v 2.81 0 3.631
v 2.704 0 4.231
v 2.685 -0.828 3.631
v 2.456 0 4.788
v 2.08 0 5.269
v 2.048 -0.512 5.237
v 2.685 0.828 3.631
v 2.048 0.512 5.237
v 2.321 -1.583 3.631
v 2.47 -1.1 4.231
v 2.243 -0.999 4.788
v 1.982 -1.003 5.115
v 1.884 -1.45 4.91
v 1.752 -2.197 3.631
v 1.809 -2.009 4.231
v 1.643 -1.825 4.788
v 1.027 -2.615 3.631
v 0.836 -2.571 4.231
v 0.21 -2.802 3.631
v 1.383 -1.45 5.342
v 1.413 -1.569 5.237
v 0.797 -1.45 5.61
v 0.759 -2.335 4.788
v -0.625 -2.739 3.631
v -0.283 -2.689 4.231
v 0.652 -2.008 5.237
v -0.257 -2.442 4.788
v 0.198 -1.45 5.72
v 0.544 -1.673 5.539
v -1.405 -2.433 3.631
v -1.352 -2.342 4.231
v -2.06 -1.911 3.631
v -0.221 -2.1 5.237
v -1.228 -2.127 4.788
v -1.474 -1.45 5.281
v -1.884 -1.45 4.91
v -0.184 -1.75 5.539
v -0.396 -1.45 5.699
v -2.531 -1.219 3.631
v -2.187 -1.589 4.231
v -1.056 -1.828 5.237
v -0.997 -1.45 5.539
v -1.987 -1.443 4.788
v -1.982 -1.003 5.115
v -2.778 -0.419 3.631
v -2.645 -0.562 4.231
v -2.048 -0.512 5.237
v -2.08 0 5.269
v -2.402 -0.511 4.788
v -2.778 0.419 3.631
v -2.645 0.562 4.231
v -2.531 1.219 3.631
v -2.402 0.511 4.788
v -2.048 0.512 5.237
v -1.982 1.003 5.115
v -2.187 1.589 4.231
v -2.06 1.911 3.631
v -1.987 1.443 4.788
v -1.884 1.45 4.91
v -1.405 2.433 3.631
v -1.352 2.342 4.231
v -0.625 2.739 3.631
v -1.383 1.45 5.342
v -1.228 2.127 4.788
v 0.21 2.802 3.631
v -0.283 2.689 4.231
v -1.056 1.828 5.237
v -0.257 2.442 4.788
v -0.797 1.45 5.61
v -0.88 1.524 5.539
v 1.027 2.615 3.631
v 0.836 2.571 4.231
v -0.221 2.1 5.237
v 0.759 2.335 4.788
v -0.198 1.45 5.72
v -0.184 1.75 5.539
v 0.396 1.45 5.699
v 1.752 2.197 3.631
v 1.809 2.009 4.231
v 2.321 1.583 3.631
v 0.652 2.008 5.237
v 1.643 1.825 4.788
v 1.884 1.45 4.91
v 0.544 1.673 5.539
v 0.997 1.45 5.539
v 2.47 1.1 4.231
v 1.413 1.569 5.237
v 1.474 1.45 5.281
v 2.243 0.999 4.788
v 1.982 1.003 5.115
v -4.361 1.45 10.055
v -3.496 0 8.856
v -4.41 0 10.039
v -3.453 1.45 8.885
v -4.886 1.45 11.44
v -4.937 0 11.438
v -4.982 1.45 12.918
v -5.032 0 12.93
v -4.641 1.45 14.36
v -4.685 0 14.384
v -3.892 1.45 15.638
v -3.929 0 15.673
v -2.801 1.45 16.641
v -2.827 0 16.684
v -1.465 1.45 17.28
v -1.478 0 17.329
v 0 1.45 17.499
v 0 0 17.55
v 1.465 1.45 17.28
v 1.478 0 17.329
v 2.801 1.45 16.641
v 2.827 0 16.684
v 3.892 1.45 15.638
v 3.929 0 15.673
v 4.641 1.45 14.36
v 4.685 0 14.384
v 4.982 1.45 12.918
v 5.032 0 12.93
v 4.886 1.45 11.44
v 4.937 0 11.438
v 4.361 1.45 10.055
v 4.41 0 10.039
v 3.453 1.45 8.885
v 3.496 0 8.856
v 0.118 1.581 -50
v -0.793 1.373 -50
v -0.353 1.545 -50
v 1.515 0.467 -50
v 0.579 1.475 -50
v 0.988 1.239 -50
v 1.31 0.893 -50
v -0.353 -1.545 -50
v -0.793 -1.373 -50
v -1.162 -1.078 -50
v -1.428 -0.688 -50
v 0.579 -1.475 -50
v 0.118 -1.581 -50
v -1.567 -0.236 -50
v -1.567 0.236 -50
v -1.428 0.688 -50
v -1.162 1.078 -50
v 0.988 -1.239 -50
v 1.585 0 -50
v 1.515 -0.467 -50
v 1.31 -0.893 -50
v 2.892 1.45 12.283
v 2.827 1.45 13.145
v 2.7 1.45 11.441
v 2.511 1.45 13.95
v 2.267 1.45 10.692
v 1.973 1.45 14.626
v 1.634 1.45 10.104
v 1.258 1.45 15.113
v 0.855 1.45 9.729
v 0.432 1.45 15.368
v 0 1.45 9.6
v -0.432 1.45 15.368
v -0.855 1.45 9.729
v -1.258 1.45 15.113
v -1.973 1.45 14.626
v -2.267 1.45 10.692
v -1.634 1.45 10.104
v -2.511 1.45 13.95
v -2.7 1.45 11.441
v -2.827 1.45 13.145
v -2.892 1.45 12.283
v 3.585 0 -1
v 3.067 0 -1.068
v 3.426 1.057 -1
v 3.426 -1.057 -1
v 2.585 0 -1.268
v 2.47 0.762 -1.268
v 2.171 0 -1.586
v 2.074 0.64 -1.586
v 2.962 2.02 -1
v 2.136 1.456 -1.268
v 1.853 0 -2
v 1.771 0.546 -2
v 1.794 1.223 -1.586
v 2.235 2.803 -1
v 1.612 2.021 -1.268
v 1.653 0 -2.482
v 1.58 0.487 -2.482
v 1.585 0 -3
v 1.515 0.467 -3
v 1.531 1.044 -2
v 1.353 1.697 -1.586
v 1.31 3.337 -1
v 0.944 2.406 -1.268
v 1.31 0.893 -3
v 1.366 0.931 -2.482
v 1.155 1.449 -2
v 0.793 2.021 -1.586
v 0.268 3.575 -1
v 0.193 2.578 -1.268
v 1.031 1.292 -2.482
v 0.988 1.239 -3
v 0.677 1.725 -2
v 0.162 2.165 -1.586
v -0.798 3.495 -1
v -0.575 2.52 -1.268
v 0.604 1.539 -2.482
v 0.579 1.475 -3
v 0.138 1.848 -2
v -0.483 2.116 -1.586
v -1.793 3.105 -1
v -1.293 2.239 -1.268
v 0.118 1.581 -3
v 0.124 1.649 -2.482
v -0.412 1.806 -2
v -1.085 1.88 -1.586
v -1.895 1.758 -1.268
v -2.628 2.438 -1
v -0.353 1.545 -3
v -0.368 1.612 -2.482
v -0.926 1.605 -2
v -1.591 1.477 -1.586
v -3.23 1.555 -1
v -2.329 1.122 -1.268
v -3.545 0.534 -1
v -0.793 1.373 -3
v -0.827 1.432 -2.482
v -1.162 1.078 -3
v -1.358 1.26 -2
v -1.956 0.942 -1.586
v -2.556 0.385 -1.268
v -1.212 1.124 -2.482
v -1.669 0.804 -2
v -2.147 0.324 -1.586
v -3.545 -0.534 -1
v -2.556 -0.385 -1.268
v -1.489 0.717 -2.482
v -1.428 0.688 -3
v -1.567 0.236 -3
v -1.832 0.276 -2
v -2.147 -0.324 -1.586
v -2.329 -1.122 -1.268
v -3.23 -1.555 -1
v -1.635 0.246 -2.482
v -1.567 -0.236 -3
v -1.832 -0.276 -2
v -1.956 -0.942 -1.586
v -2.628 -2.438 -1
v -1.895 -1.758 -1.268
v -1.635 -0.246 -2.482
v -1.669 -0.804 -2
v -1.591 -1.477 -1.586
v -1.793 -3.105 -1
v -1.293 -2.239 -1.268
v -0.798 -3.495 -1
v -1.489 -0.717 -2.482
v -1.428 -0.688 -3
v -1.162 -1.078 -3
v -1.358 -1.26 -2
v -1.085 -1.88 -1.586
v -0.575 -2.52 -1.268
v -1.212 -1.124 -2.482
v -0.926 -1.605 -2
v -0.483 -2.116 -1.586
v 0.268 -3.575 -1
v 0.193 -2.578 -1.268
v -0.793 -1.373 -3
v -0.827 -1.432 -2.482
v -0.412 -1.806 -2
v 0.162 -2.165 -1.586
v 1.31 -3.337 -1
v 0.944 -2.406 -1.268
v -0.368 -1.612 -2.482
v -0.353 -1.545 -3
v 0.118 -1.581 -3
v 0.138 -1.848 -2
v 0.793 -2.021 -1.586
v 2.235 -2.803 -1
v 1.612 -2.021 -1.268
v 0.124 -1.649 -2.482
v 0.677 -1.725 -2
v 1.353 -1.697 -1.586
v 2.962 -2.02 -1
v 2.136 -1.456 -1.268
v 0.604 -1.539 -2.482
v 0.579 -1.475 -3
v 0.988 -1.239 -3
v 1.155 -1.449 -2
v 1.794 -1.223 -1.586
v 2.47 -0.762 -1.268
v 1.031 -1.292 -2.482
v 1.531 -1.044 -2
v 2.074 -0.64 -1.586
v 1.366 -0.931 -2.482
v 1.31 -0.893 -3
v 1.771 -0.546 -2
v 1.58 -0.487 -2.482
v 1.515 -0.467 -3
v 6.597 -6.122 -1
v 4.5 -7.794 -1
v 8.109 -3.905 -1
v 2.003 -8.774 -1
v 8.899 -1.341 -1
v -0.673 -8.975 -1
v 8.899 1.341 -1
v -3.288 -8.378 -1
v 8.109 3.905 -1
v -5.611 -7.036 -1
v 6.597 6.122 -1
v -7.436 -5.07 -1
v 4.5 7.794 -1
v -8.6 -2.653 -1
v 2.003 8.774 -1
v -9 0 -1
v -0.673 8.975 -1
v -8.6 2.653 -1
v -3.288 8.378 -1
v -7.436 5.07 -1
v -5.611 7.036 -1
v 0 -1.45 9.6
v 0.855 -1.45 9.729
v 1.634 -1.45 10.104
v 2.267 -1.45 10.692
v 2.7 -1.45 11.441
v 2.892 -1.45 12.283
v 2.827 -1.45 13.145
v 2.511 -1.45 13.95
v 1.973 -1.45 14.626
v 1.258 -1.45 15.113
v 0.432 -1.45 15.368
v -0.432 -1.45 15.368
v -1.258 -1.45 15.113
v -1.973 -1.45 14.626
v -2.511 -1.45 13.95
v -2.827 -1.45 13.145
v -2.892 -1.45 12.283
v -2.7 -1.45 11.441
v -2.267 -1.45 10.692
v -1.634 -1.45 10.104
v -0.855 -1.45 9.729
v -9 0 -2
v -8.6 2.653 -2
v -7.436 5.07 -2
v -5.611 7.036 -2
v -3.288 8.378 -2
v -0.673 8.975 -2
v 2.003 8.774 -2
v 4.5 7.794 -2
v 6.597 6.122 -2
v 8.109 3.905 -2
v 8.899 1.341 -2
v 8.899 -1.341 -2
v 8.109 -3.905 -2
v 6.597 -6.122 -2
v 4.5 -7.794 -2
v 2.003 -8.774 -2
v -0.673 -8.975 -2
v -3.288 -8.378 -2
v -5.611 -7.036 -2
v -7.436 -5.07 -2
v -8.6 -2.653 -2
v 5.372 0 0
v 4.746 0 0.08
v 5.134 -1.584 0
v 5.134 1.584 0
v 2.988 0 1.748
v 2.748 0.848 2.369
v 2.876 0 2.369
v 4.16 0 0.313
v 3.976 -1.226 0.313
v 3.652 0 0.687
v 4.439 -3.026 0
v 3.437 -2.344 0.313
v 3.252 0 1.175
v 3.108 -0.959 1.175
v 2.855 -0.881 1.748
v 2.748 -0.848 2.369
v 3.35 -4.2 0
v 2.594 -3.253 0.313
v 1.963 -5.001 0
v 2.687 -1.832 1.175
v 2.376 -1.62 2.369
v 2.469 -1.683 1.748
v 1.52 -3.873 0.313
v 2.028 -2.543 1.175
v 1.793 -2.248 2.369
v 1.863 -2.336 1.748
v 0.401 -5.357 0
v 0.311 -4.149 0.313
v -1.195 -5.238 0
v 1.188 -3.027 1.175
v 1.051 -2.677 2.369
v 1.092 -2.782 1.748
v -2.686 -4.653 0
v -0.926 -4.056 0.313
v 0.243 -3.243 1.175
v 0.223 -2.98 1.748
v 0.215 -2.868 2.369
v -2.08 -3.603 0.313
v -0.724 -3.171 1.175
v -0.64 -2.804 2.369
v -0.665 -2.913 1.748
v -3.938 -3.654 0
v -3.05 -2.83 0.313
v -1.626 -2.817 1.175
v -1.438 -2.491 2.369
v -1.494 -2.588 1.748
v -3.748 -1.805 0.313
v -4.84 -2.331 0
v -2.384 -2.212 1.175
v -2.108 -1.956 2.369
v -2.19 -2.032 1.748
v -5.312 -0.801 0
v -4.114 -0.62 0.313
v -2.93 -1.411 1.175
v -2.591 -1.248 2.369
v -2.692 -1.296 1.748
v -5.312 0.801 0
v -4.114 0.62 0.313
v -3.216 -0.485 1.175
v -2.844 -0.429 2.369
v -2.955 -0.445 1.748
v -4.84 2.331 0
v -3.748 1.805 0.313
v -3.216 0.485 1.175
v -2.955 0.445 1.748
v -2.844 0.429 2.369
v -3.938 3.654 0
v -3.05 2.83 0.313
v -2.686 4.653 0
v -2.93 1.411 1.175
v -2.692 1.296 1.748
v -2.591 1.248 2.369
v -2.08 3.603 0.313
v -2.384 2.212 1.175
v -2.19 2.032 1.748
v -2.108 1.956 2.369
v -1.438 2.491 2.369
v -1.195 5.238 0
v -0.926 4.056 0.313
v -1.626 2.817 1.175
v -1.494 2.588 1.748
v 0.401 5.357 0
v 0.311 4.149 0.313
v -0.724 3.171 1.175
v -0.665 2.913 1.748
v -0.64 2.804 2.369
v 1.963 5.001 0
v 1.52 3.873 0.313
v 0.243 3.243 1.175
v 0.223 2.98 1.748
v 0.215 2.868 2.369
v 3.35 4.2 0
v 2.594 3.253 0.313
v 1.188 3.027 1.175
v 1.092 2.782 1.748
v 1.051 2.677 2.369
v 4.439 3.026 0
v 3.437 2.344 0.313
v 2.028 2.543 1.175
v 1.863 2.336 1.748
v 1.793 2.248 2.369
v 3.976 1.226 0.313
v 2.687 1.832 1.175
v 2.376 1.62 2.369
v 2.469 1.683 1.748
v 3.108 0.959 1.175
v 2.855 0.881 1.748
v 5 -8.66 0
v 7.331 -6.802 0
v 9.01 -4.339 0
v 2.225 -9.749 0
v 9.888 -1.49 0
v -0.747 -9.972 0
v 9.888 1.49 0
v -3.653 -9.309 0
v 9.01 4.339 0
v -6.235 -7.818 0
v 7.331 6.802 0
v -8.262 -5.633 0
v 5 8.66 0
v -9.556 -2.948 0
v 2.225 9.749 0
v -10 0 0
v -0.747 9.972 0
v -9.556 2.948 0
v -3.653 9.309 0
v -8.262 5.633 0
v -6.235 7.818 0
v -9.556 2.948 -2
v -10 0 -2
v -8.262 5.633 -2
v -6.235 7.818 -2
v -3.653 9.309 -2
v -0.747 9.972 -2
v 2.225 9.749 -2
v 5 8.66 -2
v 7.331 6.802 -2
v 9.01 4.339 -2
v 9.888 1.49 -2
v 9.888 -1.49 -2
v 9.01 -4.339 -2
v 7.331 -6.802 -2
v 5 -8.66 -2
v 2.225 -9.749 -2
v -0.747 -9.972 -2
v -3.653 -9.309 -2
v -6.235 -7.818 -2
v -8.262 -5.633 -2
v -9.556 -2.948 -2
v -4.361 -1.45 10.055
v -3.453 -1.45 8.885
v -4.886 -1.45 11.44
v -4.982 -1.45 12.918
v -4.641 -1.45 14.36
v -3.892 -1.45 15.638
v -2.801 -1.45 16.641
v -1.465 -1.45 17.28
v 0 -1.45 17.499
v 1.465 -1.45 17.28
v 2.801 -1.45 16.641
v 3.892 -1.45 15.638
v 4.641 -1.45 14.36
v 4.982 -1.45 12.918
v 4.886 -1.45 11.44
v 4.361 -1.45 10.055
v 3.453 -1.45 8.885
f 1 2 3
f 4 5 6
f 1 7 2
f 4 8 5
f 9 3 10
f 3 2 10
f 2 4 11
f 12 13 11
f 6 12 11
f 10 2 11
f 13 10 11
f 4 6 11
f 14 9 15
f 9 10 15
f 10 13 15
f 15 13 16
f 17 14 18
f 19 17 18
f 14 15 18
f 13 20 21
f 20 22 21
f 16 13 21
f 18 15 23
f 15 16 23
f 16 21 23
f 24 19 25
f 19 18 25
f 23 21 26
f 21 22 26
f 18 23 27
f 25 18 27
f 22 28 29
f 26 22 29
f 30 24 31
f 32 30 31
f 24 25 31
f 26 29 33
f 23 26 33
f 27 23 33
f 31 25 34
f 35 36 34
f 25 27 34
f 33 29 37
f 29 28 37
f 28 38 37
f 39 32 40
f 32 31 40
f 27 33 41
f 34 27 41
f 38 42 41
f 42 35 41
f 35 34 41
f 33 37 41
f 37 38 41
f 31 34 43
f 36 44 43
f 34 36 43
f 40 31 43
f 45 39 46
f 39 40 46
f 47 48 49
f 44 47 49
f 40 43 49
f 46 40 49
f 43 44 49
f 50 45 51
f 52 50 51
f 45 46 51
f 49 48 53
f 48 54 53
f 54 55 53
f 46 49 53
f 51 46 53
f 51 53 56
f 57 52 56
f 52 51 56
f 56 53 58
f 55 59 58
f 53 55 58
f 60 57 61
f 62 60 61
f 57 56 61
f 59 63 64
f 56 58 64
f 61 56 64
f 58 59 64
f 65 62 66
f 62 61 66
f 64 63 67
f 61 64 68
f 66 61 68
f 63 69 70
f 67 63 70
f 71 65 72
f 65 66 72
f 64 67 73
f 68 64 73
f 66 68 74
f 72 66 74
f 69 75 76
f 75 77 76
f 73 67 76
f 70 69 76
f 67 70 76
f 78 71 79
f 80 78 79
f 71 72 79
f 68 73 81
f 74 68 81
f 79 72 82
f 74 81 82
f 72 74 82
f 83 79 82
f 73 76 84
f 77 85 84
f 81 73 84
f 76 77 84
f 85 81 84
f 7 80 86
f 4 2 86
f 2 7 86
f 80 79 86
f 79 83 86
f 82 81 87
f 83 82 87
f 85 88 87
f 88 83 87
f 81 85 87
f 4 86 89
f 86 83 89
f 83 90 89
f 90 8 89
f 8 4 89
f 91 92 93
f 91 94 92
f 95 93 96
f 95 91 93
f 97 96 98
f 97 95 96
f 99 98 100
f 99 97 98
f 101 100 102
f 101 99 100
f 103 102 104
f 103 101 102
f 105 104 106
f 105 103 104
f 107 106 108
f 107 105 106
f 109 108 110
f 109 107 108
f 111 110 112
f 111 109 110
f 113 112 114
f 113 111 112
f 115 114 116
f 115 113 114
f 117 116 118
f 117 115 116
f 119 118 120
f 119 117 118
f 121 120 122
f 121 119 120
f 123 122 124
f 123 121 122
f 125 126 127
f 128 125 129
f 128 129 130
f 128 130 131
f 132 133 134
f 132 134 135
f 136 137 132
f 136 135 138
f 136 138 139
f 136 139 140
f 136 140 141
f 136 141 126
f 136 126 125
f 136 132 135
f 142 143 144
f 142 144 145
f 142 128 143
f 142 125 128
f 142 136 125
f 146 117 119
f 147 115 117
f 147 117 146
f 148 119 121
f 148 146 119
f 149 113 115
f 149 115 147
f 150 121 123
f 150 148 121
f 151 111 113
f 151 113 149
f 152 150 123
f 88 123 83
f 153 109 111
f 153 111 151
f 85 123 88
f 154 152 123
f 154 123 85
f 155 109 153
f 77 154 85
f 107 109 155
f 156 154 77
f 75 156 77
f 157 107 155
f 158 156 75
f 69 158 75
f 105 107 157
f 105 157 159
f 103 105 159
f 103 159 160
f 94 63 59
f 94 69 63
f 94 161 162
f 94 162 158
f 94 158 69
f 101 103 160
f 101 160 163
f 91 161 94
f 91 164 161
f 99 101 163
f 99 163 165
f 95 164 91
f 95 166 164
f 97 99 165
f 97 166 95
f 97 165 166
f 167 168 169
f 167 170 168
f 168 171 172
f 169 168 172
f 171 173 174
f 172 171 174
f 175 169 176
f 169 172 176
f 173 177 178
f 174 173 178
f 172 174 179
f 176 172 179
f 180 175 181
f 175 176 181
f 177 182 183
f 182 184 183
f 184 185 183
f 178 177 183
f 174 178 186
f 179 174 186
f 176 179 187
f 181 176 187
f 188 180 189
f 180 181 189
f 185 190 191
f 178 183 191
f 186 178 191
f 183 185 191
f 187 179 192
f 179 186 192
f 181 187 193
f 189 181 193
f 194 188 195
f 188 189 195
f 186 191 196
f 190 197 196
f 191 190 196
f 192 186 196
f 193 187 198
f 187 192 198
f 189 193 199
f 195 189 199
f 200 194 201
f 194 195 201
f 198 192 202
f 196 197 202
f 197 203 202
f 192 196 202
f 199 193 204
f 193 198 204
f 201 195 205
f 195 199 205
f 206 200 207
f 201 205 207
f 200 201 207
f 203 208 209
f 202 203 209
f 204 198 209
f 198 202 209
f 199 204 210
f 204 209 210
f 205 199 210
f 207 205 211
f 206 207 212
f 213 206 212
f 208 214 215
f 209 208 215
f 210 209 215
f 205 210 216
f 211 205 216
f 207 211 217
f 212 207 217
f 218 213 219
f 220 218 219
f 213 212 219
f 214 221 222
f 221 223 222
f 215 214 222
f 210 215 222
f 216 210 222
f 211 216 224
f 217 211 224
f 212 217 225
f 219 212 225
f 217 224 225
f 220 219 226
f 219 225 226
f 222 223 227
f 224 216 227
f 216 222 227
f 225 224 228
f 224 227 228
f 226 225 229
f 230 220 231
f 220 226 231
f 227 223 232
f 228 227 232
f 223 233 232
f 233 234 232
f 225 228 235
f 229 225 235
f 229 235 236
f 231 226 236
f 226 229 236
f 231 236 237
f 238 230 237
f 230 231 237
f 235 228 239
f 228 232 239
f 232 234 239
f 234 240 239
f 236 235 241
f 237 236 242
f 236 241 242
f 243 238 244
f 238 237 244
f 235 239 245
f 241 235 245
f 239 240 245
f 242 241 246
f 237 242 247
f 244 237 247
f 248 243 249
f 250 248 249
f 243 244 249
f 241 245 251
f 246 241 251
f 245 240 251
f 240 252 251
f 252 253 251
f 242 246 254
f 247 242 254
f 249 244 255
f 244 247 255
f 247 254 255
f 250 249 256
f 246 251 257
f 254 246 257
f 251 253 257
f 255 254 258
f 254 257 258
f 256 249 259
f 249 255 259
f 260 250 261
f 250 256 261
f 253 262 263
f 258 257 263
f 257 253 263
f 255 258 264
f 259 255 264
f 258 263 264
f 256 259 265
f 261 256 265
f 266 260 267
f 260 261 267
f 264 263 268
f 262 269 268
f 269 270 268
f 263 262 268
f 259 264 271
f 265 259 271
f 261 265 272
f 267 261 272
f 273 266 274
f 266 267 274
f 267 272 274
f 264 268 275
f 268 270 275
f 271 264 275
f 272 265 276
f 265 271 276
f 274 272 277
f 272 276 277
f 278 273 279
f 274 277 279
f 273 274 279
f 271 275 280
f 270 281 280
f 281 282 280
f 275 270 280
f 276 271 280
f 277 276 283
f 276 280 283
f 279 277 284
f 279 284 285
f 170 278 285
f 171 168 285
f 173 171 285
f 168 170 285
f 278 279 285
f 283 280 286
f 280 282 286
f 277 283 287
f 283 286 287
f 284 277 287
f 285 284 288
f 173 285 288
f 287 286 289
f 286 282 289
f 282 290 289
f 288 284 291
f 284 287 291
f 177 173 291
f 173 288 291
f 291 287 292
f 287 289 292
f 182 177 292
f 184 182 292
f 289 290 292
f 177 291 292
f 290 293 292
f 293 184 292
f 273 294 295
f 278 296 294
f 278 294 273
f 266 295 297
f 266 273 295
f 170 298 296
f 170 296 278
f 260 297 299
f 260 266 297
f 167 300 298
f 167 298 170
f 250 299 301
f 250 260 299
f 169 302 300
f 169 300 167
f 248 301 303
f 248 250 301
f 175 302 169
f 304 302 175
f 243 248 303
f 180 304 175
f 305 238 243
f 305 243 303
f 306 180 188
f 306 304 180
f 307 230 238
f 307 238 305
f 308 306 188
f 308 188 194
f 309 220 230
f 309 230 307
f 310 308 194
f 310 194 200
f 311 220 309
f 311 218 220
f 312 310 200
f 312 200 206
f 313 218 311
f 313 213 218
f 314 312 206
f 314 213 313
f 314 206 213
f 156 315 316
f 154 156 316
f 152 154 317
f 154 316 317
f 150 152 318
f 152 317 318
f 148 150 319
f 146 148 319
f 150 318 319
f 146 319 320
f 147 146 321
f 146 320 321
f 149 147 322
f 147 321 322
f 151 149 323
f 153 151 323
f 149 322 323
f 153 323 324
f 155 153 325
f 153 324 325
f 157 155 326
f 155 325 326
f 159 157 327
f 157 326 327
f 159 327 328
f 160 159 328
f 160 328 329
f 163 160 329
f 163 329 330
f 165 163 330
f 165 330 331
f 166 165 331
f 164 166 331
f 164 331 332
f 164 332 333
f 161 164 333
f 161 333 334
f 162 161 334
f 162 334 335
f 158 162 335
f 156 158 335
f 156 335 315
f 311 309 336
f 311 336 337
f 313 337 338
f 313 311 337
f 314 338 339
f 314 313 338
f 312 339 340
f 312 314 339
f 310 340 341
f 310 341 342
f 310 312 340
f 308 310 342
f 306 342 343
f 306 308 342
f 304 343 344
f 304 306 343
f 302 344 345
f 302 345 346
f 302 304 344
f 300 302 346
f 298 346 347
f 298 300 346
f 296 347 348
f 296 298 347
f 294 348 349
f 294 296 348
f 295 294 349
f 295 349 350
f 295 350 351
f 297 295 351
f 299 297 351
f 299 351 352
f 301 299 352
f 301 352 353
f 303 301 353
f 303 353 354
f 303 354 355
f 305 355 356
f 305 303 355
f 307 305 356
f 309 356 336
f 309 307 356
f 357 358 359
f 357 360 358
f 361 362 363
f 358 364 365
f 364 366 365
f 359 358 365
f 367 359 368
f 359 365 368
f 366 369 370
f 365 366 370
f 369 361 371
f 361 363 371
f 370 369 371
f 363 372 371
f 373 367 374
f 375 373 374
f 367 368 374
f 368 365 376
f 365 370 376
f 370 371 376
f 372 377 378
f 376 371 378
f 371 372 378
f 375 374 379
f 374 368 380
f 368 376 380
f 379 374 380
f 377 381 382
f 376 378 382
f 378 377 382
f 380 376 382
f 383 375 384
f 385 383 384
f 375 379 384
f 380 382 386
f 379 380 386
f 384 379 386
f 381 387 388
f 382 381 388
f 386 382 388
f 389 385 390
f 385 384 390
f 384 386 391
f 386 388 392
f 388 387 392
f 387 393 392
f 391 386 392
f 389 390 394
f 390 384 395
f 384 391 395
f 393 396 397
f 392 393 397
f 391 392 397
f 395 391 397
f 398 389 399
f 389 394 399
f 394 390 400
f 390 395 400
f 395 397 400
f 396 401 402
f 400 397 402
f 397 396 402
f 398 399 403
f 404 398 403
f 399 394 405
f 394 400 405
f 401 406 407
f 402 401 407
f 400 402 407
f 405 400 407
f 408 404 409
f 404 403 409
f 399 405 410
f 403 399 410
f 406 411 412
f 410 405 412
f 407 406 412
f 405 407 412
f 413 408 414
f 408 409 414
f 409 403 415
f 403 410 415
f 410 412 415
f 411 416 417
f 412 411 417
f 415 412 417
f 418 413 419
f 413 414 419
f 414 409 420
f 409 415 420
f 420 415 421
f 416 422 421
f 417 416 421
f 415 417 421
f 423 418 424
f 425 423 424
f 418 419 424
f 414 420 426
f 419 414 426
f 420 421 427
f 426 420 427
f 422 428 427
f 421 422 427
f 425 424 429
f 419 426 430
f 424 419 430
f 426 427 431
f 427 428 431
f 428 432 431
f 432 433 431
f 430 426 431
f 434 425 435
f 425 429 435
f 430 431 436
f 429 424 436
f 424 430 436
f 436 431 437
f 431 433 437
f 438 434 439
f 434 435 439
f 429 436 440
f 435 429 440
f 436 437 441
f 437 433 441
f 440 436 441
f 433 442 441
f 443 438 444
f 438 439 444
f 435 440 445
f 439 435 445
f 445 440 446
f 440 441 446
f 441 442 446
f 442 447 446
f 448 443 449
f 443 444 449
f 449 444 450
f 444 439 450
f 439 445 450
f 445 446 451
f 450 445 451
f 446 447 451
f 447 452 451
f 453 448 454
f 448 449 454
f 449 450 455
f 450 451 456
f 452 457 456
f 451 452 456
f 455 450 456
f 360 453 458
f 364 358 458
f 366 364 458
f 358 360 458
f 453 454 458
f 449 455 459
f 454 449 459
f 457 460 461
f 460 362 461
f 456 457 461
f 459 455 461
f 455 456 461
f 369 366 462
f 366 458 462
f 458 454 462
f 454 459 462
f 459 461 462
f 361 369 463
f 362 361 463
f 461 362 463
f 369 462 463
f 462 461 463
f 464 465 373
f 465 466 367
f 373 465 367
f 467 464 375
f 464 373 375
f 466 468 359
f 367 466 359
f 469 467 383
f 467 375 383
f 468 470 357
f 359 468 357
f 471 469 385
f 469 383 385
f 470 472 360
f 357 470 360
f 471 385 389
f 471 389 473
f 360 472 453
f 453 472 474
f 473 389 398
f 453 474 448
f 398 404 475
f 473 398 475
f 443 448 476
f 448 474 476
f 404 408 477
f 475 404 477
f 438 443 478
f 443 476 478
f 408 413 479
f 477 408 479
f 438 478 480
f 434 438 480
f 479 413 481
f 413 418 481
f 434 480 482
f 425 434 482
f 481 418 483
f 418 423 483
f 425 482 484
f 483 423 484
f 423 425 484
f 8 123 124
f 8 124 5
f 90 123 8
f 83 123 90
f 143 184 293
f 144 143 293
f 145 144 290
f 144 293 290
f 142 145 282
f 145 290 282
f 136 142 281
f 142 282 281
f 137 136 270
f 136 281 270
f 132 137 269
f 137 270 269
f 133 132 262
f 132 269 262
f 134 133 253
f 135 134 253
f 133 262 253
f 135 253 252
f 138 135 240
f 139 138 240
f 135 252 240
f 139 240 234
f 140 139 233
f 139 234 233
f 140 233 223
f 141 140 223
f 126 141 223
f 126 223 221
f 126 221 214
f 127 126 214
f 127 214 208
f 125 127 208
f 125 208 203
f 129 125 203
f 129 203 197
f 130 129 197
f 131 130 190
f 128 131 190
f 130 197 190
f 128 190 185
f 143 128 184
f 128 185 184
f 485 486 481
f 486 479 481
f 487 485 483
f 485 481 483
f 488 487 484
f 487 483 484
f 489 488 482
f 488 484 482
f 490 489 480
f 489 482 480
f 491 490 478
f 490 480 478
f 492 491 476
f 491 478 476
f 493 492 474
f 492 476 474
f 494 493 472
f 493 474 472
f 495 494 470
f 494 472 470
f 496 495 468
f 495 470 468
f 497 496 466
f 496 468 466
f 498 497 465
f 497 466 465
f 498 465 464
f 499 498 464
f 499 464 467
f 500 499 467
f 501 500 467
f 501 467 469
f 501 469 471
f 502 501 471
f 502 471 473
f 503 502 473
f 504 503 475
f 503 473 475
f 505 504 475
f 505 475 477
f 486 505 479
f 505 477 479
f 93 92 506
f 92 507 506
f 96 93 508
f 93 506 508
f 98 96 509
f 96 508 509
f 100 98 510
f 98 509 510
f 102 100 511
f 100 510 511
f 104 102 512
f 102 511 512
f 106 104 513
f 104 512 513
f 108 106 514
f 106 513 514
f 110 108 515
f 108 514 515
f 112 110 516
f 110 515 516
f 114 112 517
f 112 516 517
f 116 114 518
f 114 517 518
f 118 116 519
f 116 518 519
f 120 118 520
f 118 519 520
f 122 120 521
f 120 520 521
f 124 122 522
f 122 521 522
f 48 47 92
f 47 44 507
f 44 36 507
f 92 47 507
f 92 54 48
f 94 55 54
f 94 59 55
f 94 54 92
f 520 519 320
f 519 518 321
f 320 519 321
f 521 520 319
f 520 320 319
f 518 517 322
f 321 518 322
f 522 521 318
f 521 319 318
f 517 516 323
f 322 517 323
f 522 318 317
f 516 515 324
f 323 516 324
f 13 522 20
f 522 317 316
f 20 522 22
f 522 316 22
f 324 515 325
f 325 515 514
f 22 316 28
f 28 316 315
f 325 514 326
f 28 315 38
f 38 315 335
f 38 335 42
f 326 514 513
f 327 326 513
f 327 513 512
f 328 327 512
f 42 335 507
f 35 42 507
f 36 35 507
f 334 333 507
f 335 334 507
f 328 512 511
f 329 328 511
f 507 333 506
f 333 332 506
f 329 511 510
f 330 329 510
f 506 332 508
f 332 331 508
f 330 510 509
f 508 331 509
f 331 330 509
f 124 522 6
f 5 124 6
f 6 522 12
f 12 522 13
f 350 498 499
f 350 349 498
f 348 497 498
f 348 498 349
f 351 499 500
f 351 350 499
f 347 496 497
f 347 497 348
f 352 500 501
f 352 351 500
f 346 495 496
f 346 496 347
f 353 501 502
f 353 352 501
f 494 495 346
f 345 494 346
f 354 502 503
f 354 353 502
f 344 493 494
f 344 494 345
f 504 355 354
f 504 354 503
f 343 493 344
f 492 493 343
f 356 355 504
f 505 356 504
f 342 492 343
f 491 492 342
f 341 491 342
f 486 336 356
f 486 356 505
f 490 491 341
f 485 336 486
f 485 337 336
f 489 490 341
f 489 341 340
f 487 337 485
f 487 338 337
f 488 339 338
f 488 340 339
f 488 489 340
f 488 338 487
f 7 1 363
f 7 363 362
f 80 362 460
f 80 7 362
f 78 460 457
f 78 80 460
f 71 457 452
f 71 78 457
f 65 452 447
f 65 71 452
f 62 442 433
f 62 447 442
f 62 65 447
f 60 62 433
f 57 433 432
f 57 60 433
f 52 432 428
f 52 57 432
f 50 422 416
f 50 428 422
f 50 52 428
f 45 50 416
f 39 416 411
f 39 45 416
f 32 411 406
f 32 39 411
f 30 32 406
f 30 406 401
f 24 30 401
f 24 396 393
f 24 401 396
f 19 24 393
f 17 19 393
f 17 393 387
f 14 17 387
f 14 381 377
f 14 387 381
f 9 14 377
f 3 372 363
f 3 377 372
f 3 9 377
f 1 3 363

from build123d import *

# Parameters (mm, degrees)
SKETCH1_R                     = 3
BASE_EXTRUDE_DEPTH            = 6
BASE_EXTRUDE_TAPER            = 3
FILLET1_R                     = 2.5
BOSS_EXTRUDE1_DEPTH           = 1.45
BOSS_EXTRUDE1_TAPER           = 2
BOSS_EXTRUDE1_OTHER_WAY_DEPTH = 1.45
BOSS_EXTRUDE1_OTHER_WAY_TAPER = 2
SKETCH3_R                     = 2.9
CUT_EXTRUDE1_DEPTH            = 19.796475854
SKETCH4_R                     = 1.585
BOSS_EXTRUDE2_DEPTH           = 50
SKETCH5_R                     = 10
SKETCH5_R_2                   = 1.585
BOSS_EXTRUDE3_DEPTH           = 1
SKETCH11_R                    = 10
SKETCH11_R_2                  = 9
EXTRUDE1_DEPTH                = 1
FILLET5_R                     = 2.5
FILLET6_R                     = 2


with BuildPart() as part:
    # Sketch1 → Base-Extrude (new body)
    with BuildSketch(Plane.XY):
        Circle(SKETCH1_R)
    extrude(amount=BASE_EXTRUDE_DEPTH, taper=BASE_EXTRUDE_TAPER)

    # Fillet1
    fillet1_edges = [part.edges().sort_by_distance(p)[0] for p in [
        (-2.685553324, 0, 6),
    ]]
    fillet(fillet1_edges, radius=FILLET1_R)

    # Sketch2 → Boss-Extrude1 (add)
    with BuildSketch(Plane(origin=(0, 0, 0), x_dir=(1, 0, 0), z_dir=(0, 1, 0))):
        with BuildLine():
            Line((3.495897193, -8.85566154), (0, 0))
            Line((0, 0), (-3.495897193, -8.85566154))
            ThreePointArc((-3.495897193, -8.85566154), (0, -17.55), (3.495897193, -8.85566154))
        make_face()
    extrude(amount=BOSS_EXTRUDE1_DEPTH, taper=BOSS_EXTRUDE1_TAPER)

    # Sketch2 → Boss-Extrude1 other way (add)
    with BuildSketch(Plane(origin=(0, 0, 0), x_dir=(1, 0, 0), z_dir=(0, 1, 0))):
        with BuildLine():
            Line((3.495897193, -8.85566154), (0, 0))
            Line((0, 0), (-3.495897193, -8.85566154))
            ThreePointArc((-3.495897193, -8.85566154), (0, -17.55), (3.495897193, -8.85566154))
        make_face()
    extrude(amount=-BOSS_EXTRUDE1_OTHER_WAY_DEPTH, taper=BOSS_EXTRUDE1_OTHER_WAY_TAPER)

    # Sketch3 → Cut-Extrude1 (cut, through all)
    with BuildSketch(Plane.XZ.offset(1.45)):
        with Locations(Location((0, 12.5, 0), (0, 0, 270))):
            Circle(SKETCH3_R)
    extrude(amount=-CUT_EXTRUDE1_DEPTH, mode=Mode.SUBTRACT)

    # Sketch4 → Boss-Extrude2 (add)
    with BuildSketch(Plane(origin=(0, 0, 0), x_dir=(-1, 0, 0), z_dir=(0, 0, -1))):
        with Locations(Location((0, 0, 0), (0, 0, 180))):
            Circle(SKETCH4_R)
    extrude(amount=BOSS_EXTRUDE2_DEPTH)

    # Sketch5 → Boss-Extrude3 (add)
    with BuildSketch(Plane(origin=(0, 0, 0), x_dir=(-1, 0, 0), z_dir=(0, 0, -1))):
        Circle(SKETCH5_R)
        Circle(SKETCH5_R_2, mode=Mode.SUBTRACT)
    extrude(amount=BOSS_EXTRUDE3_DEPTH)

    # Sketch11 → Extrude1 (add)
    with BuildSketch(Plane(origin=(0, 0, -1), x_dir=(-1, 0, 0), z_dir=(0, 0, -1))):
        Circle(SKETCH11_R)
        Circle(SKETCH11_R_2, mode=Mode.SUBTRACT)
    extrude(amount=EXTRUDE1_DEPTH)

    # Fillet5
    fillet5_edges = [part.edges().sort_by_distance(p)[0] for p in [
        (-3, 0, 0),
    ]]
    fillet(fillet5_edges, radius=FILLET5_R)

    # Fillet6
    fillet6_edges = [part.edges().sort_by_distance(p)[0] for p in [
        (-1.585, 0, -1),
    ]]
    fillet(fillet6_edges, radius=FILLET6_R)


solid = part.part
